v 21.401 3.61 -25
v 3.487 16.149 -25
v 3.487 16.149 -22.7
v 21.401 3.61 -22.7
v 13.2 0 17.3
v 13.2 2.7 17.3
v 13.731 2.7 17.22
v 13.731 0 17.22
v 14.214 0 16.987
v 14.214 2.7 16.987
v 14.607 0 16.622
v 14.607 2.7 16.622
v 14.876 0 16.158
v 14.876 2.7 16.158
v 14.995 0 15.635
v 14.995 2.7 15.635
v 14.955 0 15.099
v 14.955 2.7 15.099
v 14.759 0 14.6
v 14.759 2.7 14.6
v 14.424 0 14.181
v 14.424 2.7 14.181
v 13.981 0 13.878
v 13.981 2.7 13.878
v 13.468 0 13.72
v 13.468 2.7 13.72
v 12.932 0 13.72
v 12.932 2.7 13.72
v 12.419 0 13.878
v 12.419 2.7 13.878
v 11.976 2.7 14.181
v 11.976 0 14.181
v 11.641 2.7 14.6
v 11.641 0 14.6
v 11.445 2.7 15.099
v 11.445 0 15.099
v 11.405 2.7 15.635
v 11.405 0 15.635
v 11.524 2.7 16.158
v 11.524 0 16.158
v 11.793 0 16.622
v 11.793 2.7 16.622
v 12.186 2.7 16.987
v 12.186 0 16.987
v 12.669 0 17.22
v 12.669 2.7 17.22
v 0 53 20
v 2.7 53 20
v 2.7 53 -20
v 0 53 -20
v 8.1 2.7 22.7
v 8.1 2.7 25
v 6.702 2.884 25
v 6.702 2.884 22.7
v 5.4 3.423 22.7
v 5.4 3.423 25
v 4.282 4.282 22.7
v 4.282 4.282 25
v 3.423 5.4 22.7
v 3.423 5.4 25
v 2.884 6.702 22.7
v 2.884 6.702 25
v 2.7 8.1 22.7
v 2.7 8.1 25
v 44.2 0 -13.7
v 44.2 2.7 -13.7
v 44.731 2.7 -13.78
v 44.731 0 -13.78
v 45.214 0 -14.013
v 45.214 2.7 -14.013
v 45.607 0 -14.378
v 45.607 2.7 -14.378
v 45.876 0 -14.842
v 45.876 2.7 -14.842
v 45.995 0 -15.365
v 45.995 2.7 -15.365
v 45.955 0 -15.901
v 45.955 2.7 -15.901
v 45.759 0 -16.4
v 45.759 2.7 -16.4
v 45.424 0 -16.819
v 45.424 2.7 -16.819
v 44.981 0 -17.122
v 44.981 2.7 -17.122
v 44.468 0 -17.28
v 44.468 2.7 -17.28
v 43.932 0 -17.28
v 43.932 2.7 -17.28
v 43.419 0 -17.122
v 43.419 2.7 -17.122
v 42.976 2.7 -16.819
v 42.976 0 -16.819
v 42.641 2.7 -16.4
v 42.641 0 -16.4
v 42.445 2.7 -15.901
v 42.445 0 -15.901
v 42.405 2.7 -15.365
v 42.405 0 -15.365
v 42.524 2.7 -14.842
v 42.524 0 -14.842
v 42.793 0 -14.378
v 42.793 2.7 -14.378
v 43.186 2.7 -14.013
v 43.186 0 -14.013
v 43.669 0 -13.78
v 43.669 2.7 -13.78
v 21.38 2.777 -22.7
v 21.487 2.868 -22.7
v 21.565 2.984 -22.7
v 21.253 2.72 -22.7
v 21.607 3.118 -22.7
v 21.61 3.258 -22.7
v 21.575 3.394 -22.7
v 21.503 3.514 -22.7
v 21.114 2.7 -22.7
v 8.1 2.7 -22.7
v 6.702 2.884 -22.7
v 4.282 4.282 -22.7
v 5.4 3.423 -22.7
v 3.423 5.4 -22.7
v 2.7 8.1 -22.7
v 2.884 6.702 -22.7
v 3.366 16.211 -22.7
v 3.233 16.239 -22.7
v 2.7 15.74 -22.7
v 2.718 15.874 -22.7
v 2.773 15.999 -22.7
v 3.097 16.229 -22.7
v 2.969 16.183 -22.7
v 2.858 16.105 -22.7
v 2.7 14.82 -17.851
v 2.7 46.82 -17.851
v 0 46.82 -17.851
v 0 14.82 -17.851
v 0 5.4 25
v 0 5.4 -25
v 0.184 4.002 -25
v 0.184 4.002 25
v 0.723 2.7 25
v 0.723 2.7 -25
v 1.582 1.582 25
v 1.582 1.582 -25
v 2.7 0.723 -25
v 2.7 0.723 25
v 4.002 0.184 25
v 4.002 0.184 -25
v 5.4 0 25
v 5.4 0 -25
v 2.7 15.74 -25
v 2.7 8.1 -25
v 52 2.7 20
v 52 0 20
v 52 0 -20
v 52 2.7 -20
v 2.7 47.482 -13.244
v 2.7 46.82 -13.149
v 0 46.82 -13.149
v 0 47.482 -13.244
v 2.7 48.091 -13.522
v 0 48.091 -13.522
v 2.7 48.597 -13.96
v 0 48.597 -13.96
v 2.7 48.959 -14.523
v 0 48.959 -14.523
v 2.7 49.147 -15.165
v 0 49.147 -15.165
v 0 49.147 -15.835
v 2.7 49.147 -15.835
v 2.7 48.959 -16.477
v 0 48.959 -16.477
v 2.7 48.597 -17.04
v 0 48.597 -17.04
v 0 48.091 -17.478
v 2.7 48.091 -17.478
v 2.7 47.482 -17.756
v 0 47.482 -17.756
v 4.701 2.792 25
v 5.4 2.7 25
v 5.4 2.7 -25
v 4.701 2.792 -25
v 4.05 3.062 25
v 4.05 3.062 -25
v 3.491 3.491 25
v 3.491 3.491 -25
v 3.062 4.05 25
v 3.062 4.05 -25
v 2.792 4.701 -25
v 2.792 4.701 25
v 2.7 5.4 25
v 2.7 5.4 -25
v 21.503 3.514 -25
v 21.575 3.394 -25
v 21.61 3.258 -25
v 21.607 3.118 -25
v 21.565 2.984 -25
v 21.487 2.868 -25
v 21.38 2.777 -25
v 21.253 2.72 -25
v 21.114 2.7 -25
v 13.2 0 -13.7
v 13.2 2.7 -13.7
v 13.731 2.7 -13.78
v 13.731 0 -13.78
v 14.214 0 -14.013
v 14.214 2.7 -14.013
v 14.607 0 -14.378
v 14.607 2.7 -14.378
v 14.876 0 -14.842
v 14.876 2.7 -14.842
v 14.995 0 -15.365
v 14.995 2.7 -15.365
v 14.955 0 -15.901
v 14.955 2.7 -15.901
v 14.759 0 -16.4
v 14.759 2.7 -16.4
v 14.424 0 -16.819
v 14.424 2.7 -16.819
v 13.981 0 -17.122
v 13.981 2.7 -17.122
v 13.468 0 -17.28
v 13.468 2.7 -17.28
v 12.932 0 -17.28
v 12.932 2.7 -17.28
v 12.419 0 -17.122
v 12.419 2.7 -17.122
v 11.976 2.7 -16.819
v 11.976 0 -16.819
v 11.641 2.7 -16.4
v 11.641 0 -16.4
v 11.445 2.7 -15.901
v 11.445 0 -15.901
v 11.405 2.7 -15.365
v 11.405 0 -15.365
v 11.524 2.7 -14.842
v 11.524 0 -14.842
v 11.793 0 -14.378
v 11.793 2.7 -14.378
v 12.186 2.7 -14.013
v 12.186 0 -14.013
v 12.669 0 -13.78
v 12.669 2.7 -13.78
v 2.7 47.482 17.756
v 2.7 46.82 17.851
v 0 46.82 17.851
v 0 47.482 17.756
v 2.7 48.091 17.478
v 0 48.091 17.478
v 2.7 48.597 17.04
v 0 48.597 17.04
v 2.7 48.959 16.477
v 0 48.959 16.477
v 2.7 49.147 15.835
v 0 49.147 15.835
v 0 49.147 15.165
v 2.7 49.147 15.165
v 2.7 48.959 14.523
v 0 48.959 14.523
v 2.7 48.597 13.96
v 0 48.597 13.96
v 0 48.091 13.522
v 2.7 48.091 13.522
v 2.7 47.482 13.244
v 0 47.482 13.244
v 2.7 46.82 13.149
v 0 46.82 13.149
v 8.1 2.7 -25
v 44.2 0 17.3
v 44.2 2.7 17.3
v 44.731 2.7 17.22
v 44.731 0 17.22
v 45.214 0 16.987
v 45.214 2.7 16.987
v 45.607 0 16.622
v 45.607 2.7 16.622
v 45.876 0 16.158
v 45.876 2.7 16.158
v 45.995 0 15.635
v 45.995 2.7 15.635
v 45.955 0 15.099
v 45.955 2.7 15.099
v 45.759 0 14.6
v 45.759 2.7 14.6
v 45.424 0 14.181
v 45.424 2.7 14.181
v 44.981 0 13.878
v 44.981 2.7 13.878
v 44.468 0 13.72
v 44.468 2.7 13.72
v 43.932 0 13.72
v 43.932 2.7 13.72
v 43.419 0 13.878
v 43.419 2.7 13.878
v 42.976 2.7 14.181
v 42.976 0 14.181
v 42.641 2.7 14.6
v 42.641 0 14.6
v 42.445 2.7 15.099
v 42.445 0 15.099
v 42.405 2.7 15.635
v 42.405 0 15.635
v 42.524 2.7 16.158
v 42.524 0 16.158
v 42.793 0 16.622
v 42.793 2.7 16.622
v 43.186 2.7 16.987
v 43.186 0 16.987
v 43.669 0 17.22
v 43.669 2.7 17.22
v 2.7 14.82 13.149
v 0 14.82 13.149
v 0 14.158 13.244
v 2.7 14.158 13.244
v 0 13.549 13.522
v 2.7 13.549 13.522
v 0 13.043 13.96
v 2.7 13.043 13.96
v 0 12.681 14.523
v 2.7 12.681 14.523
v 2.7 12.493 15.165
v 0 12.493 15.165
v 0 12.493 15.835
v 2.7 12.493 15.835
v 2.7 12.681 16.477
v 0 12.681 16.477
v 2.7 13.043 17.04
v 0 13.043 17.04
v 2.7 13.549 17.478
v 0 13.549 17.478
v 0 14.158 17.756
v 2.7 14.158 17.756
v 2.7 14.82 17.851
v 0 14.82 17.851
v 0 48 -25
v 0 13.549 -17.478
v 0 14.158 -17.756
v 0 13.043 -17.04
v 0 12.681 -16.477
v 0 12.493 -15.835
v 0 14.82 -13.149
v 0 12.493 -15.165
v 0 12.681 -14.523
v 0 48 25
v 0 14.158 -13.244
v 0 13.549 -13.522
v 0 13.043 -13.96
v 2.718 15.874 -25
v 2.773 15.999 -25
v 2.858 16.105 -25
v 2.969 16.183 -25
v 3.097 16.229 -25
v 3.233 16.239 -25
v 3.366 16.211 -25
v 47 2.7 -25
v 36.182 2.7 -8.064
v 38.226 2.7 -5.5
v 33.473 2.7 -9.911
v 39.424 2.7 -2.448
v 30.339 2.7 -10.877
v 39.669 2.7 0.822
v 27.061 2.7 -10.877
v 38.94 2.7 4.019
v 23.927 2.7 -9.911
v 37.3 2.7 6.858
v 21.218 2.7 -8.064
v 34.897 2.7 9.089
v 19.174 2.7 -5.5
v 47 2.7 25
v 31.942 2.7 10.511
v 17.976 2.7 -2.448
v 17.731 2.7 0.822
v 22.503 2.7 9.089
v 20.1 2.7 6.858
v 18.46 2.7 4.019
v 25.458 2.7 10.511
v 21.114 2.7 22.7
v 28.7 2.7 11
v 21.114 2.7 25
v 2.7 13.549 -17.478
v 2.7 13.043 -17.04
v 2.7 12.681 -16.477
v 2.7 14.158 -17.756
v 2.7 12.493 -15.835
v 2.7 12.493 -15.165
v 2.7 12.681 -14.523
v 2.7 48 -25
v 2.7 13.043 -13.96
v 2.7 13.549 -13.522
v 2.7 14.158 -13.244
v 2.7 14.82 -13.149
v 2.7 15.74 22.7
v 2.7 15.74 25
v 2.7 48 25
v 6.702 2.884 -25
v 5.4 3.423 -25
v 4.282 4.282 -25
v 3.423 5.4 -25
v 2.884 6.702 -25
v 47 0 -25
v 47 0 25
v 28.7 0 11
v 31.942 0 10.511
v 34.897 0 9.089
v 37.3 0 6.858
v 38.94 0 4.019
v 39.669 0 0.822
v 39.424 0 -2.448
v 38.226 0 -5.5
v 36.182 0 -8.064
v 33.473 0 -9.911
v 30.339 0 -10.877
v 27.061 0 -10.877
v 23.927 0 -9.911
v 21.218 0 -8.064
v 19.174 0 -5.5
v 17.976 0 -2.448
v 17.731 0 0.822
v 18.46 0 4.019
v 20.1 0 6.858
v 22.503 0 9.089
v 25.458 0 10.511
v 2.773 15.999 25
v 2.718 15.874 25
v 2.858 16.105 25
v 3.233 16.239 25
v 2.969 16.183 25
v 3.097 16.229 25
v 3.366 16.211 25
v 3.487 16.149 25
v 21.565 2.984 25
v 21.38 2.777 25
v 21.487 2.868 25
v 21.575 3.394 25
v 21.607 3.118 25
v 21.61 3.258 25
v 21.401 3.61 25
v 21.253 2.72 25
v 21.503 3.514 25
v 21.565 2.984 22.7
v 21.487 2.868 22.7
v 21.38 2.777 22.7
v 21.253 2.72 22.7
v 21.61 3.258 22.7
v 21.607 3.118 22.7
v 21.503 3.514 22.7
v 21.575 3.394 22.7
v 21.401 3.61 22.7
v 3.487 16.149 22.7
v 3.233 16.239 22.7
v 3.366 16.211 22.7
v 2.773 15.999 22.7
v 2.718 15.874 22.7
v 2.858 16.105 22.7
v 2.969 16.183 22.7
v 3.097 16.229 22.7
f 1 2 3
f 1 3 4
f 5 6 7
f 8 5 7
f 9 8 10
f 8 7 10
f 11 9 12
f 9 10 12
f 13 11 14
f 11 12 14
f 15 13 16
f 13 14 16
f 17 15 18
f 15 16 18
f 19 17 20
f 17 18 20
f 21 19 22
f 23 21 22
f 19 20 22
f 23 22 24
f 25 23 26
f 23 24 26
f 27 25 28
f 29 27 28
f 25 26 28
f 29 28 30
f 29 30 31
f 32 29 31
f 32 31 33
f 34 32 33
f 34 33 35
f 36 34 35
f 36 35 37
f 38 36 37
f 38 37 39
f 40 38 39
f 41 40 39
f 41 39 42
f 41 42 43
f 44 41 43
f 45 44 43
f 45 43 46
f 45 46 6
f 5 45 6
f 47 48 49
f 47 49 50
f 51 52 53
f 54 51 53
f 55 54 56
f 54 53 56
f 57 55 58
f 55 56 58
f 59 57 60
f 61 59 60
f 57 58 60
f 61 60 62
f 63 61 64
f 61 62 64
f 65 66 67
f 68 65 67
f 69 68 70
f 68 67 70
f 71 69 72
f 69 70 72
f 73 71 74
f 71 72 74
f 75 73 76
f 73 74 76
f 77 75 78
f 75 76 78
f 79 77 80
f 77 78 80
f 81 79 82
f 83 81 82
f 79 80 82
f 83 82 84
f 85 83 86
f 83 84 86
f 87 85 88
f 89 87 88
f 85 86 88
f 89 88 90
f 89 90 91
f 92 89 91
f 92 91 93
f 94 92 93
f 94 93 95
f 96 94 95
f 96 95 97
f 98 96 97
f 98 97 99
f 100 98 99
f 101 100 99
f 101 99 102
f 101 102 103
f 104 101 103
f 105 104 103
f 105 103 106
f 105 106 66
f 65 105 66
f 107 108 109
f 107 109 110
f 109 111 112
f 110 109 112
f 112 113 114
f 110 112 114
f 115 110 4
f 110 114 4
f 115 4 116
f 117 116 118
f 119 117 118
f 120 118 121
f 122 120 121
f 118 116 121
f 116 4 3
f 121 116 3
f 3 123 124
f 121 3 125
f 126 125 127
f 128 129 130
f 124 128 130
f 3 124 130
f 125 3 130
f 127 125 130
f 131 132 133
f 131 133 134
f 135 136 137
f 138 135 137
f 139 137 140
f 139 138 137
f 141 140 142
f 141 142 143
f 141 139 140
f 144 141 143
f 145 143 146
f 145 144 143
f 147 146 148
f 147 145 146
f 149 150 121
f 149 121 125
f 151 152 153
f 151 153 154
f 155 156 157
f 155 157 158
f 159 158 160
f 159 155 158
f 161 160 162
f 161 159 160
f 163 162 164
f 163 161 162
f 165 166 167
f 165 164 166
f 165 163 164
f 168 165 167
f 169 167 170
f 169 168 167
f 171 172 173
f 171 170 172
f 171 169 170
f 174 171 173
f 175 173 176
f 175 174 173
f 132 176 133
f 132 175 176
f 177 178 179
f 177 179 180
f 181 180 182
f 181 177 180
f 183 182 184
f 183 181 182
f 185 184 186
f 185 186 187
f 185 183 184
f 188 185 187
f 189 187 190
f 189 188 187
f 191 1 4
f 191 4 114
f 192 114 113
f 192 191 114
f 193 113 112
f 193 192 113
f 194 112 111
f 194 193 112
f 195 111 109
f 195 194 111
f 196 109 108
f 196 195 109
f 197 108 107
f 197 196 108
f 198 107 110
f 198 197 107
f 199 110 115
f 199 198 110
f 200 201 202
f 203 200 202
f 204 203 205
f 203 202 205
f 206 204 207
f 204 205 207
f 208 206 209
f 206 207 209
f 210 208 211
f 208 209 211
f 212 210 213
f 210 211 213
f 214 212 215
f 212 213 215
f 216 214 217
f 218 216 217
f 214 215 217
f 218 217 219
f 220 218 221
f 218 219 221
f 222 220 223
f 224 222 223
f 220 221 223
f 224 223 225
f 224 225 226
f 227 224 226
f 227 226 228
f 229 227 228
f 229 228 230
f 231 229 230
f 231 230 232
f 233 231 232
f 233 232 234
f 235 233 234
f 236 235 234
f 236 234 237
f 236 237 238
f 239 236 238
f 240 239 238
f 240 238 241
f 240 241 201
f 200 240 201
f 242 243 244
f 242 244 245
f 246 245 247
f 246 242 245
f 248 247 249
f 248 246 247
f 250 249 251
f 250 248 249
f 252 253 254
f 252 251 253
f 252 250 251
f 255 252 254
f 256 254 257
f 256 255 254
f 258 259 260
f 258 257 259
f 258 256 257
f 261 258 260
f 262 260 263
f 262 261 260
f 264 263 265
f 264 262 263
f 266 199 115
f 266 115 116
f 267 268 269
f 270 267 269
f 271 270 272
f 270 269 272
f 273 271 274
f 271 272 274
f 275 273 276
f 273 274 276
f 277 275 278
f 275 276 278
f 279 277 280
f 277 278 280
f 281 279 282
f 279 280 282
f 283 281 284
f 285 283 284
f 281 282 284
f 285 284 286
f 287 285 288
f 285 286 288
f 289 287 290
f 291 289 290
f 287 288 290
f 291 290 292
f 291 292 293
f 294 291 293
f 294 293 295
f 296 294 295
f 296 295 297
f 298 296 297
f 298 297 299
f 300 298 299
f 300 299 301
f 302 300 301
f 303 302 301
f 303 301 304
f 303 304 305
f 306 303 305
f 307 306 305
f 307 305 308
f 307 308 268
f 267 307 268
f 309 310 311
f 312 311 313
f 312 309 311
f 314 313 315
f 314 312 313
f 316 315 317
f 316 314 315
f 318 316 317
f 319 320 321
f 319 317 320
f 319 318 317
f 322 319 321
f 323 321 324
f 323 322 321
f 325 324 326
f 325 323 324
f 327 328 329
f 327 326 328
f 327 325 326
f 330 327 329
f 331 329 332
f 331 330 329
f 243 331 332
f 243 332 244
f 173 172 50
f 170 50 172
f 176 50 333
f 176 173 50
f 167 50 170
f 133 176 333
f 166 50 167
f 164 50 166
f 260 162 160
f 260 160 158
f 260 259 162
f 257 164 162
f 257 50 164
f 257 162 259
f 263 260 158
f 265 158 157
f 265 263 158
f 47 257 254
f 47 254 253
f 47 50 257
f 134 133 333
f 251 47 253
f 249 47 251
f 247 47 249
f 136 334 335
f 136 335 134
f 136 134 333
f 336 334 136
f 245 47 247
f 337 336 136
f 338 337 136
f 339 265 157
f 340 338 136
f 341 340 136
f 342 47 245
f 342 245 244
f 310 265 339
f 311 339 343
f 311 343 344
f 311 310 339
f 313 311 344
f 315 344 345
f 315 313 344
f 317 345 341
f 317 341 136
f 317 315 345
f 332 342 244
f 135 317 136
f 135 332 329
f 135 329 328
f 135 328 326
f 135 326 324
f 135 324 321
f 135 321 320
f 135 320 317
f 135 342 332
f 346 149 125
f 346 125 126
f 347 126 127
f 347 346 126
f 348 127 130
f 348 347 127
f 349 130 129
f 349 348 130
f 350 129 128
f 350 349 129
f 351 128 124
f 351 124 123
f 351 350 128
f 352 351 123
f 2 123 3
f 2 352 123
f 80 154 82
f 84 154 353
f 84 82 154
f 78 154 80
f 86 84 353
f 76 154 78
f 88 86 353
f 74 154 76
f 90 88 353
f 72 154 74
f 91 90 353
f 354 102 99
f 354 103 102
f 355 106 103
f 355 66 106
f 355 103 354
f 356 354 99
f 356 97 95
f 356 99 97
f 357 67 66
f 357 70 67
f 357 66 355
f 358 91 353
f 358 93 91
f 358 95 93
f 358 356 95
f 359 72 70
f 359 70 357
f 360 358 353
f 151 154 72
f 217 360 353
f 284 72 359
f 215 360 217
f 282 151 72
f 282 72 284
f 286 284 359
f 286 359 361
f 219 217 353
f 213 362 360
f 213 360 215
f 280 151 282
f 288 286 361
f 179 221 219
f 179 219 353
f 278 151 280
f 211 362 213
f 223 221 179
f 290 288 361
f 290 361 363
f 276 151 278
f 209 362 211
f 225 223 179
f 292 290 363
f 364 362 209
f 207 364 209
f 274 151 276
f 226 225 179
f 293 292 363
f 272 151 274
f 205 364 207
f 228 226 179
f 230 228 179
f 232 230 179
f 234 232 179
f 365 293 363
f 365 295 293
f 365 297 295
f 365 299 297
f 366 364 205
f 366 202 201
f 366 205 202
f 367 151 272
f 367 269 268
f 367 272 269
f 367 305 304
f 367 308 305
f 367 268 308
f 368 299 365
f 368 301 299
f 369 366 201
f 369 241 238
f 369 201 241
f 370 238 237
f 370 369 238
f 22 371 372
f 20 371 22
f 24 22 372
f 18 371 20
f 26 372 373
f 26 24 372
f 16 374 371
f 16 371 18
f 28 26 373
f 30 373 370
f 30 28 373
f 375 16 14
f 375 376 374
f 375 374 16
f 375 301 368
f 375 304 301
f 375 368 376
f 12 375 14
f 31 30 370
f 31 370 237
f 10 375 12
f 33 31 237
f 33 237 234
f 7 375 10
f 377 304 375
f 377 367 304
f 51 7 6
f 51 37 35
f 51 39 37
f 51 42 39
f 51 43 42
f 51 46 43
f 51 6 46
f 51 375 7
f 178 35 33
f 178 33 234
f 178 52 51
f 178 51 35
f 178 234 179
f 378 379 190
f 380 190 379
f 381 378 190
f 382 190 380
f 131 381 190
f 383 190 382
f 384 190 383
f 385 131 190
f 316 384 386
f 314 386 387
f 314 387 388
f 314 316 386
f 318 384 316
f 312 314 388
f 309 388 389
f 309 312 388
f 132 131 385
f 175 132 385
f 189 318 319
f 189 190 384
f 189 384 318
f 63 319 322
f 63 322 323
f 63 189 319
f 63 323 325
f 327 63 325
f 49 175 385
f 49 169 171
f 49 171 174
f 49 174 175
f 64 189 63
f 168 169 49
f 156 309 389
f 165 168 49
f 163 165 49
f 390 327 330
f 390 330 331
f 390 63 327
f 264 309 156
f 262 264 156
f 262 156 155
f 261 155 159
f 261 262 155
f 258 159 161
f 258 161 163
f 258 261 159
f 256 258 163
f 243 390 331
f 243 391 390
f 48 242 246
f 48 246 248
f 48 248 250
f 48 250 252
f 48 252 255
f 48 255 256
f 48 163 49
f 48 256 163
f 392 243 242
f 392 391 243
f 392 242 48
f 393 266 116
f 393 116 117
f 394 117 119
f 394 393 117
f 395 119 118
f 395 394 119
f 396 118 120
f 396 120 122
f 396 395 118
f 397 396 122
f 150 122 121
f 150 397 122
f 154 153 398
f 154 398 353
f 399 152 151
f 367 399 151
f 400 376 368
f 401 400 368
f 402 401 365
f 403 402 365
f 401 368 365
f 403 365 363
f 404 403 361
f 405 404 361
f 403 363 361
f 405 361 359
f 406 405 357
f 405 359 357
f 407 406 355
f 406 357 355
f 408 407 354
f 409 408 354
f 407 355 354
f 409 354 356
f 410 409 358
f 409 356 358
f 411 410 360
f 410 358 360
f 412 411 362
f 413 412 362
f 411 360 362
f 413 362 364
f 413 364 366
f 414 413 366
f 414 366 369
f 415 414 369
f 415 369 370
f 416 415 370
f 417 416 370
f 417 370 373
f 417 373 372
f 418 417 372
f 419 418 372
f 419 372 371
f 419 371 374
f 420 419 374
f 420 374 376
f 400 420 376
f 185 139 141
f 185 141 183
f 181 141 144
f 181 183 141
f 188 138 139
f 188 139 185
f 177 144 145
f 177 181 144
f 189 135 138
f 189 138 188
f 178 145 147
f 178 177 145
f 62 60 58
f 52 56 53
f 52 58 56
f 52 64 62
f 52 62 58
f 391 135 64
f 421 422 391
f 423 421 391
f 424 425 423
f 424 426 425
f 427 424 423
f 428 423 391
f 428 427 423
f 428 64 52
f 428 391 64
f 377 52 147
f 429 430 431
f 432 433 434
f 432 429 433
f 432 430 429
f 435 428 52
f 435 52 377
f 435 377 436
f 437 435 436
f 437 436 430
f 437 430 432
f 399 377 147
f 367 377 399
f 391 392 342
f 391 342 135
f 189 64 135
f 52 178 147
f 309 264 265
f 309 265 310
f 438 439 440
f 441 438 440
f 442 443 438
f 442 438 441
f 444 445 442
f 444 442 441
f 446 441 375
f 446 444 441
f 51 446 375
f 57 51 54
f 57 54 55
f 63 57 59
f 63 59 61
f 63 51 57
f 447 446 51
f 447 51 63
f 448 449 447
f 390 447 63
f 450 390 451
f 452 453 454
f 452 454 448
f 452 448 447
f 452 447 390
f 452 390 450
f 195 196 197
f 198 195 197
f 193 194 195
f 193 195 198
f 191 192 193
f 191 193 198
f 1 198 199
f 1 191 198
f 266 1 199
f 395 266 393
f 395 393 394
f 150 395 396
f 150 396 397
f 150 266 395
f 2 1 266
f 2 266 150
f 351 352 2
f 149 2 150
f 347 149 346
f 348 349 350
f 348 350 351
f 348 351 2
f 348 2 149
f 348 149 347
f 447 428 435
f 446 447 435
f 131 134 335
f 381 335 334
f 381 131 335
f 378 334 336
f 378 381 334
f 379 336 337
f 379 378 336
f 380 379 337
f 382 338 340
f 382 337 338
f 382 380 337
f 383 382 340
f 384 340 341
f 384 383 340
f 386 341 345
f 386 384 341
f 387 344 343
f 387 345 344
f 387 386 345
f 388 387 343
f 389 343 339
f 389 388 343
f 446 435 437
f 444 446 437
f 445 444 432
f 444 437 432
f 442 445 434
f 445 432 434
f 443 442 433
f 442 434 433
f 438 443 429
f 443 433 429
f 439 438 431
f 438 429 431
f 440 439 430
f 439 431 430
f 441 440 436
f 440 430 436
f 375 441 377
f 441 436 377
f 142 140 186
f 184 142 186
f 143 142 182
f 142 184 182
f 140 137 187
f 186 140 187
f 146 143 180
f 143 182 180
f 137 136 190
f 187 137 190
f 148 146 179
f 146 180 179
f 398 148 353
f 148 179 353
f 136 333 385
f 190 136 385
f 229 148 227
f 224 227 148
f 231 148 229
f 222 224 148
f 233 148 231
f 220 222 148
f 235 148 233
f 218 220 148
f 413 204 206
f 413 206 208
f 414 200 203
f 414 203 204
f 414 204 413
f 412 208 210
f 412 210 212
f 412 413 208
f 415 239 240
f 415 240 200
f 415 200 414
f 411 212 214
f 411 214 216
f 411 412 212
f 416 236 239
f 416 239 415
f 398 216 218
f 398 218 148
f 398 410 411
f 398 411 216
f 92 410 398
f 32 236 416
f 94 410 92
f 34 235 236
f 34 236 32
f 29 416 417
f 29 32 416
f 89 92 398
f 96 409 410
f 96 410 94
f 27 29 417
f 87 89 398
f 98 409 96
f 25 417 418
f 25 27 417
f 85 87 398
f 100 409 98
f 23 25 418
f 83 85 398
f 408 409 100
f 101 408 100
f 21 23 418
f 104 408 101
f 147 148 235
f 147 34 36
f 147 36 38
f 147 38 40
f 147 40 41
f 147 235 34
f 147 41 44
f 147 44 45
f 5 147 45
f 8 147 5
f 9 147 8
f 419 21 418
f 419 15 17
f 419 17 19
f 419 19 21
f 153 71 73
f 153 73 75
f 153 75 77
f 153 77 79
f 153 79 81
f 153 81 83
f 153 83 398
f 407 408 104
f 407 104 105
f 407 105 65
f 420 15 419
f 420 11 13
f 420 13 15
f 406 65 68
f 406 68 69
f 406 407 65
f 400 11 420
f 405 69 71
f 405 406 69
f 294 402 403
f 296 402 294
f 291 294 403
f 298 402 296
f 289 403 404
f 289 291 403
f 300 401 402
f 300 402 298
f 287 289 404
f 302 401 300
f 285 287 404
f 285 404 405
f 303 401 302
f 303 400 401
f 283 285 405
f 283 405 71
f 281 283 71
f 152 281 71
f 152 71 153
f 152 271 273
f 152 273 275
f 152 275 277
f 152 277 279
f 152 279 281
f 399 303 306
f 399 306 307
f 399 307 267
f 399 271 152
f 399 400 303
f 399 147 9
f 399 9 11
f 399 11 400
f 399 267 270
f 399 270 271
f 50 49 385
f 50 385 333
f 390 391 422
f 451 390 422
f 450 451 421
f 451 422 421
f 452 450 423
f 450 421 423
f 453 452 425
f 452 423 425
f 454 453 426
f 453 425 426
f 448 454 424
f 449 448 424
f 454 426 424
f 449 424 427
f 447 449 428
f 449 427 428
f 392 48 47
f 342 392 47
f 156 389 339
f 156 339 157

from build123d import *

# Parameters (mm, degrees)
BOSS_EXTRUDE1_DEPTH = 25
SKETCH3_R           = 11
SKETCH3_R_2         = 1.8
CUT_EXTRUDE1_DEPTH  = 50
CHAMFER1_SIZE       = 5
CUT_EXTRUDE2_DEPTH  = 50
BOSS_EXTRUDE2_DEPTH = 2.3


with BuildPart() as part:
    # Sketch1 → Boss-Extrude1 (new, symmetric)
    with BuildSketch(Plane.XY):
        with BuildLine():
            Line((0, 53), (0, 5.4))
            ThreePointArc((0, 5.4), (1.581623382, 1.581623382), (5.4, 0))
            Line((5.4, 0), (52, 0))
            Line((52, 0), (52, 2.7))
            Line((52, 2.7), (5.4, 2.7))
            ThreePointArc((5.4, 2.7), (3.490811691, 3.490811691), (2.7, 5.4))
            Line((2.7, 5.4), (2.7, 53))
            Line((2.7, 53), (0, 53))
        make_face()
    extrude(amount=BOSS_EXTRUDE1_DEPTH, both=True)

    # Sketch3 → Cut-Extrude1 (cut)
    with BuildSketch(Plane(origin=(0, 2.7, 0), x_dir=(1, 0, 0), z_dir=(0, 1, 0))):
        with Locations(Location((28.7, 0, 0), (0, 0, 270))):
            Circle(SKETCH3_R)
        with Locations(Location((44.2, 15.5, 0), (0, 0, 270))):
            Circle(SKETCH3_R_2)
        with Locations(Location((44.2, -15.5, 0), (0, 0, 270))):
            Circle(SKETCH3_R_2)
        with Locations(Location((13.2, -15.5, 0), (0, 0, 270))):
            Circle(SKETCH3_R_2)
        with Locations(Location((13.2, 15.5, 0), (0, 0, 270))):
            Circle(SKETCH3_R_2)
    extrude(amount=-CUT_EXTRUDE1_DEPTH, mode=Mode.SUBTRACT)

    # Chamfer1
    chamfer1_edges = [part.edges().sort_by_distance(p)[0] for p in [
        (1.35, 53, -25),
        (52, 1.35, 25),
        (1.35, 53, 25),
        (52, 1.35, -25),
    ]]
    chamfer(chamfer1_edges, length=CHAMFER1_SIZE)

    # Sketch4 → Cut-Extrude2 (cut)
    with BuildSketch(Plane(origin=(2.7, 0, 0), x_dir=(0, 0, -1), z_dir=(1, 0, 0))):
        with BuildLine():
            Line((-17.851169652, 14.819907576), (-17.851169652, 46.819907056))
            ThreePointArc((-17.851169652, 46.819907056), (-15.5, 49.171076708), (-13.148830348, 46.819907056))
            Line((-13.148830348, 46.819907056), (-13.148830348, 14.819907576))
            ThreePointArc((-13.148830348, 14.819907576), (-15.5, 12.468737404), (-17.851169652, 14.819907576))
        make_face()
        with BuildLine():
            Line((13.148830348, 14.819907576), (13.148830348, 46.819907056))
            ThreePointArc((13.148830348, 46.819907056), (15.5, 49.171076708), (17.851169652, 46.819907056))
            Line((17.851169652, 46.819907056), (17.851169652, 14.819907576))
            ThreePointArc((17.851169652, 14.819907576), (15.5, 12.468737404), (13.148830348, 14.819907576))
        make_face()
    extrude(amount=-CUT_EXTRUDE2_DEPTH, mode=Mode.SUBTRACT)


with BuildPart() as body_2:
    # Sketch5 → Boss-Extrude2 (new body)
    with BuildSketch(Plane(origin=(0, 0, -25), x_dir=(-1, 0, 0), z_dir=(0, 0, -1))):
        with BuildLine():
            Line((-3.486731172, 16.149288179), (-21.400548628, 3.60961596))
            ThreePointArc((-21.400548628, 3.60961596), (-21.5906864, 3.049680308), (-21.113817456, 2.7))
            Line((-21.113817456, 2.7), (-8.1, 2.7))
            ThreePointArc((-8.1, 2.7), (-4.281623382, 4.281623382), (-2.7, 8.1))
            Line((-2.7, 8.1), (-2.7, 15.739672219))
            ThreePointArc((-2.7, 15.739672219), (-2.96909481, 16.183161557), (-3.486731172, 16.149288179))
        make_face()
    boss_extrude2 = extrude(amount=-BOSS_EXTRUDE2_DEPTH)


with BuildPart() as part_1:
    add(part.part)

    # Mirror2: Boss-Extrude2 across plane
    add(boss_extrude2.mirror(Plane.XY))


solid = Compound([body_2.part, part_1.part])
